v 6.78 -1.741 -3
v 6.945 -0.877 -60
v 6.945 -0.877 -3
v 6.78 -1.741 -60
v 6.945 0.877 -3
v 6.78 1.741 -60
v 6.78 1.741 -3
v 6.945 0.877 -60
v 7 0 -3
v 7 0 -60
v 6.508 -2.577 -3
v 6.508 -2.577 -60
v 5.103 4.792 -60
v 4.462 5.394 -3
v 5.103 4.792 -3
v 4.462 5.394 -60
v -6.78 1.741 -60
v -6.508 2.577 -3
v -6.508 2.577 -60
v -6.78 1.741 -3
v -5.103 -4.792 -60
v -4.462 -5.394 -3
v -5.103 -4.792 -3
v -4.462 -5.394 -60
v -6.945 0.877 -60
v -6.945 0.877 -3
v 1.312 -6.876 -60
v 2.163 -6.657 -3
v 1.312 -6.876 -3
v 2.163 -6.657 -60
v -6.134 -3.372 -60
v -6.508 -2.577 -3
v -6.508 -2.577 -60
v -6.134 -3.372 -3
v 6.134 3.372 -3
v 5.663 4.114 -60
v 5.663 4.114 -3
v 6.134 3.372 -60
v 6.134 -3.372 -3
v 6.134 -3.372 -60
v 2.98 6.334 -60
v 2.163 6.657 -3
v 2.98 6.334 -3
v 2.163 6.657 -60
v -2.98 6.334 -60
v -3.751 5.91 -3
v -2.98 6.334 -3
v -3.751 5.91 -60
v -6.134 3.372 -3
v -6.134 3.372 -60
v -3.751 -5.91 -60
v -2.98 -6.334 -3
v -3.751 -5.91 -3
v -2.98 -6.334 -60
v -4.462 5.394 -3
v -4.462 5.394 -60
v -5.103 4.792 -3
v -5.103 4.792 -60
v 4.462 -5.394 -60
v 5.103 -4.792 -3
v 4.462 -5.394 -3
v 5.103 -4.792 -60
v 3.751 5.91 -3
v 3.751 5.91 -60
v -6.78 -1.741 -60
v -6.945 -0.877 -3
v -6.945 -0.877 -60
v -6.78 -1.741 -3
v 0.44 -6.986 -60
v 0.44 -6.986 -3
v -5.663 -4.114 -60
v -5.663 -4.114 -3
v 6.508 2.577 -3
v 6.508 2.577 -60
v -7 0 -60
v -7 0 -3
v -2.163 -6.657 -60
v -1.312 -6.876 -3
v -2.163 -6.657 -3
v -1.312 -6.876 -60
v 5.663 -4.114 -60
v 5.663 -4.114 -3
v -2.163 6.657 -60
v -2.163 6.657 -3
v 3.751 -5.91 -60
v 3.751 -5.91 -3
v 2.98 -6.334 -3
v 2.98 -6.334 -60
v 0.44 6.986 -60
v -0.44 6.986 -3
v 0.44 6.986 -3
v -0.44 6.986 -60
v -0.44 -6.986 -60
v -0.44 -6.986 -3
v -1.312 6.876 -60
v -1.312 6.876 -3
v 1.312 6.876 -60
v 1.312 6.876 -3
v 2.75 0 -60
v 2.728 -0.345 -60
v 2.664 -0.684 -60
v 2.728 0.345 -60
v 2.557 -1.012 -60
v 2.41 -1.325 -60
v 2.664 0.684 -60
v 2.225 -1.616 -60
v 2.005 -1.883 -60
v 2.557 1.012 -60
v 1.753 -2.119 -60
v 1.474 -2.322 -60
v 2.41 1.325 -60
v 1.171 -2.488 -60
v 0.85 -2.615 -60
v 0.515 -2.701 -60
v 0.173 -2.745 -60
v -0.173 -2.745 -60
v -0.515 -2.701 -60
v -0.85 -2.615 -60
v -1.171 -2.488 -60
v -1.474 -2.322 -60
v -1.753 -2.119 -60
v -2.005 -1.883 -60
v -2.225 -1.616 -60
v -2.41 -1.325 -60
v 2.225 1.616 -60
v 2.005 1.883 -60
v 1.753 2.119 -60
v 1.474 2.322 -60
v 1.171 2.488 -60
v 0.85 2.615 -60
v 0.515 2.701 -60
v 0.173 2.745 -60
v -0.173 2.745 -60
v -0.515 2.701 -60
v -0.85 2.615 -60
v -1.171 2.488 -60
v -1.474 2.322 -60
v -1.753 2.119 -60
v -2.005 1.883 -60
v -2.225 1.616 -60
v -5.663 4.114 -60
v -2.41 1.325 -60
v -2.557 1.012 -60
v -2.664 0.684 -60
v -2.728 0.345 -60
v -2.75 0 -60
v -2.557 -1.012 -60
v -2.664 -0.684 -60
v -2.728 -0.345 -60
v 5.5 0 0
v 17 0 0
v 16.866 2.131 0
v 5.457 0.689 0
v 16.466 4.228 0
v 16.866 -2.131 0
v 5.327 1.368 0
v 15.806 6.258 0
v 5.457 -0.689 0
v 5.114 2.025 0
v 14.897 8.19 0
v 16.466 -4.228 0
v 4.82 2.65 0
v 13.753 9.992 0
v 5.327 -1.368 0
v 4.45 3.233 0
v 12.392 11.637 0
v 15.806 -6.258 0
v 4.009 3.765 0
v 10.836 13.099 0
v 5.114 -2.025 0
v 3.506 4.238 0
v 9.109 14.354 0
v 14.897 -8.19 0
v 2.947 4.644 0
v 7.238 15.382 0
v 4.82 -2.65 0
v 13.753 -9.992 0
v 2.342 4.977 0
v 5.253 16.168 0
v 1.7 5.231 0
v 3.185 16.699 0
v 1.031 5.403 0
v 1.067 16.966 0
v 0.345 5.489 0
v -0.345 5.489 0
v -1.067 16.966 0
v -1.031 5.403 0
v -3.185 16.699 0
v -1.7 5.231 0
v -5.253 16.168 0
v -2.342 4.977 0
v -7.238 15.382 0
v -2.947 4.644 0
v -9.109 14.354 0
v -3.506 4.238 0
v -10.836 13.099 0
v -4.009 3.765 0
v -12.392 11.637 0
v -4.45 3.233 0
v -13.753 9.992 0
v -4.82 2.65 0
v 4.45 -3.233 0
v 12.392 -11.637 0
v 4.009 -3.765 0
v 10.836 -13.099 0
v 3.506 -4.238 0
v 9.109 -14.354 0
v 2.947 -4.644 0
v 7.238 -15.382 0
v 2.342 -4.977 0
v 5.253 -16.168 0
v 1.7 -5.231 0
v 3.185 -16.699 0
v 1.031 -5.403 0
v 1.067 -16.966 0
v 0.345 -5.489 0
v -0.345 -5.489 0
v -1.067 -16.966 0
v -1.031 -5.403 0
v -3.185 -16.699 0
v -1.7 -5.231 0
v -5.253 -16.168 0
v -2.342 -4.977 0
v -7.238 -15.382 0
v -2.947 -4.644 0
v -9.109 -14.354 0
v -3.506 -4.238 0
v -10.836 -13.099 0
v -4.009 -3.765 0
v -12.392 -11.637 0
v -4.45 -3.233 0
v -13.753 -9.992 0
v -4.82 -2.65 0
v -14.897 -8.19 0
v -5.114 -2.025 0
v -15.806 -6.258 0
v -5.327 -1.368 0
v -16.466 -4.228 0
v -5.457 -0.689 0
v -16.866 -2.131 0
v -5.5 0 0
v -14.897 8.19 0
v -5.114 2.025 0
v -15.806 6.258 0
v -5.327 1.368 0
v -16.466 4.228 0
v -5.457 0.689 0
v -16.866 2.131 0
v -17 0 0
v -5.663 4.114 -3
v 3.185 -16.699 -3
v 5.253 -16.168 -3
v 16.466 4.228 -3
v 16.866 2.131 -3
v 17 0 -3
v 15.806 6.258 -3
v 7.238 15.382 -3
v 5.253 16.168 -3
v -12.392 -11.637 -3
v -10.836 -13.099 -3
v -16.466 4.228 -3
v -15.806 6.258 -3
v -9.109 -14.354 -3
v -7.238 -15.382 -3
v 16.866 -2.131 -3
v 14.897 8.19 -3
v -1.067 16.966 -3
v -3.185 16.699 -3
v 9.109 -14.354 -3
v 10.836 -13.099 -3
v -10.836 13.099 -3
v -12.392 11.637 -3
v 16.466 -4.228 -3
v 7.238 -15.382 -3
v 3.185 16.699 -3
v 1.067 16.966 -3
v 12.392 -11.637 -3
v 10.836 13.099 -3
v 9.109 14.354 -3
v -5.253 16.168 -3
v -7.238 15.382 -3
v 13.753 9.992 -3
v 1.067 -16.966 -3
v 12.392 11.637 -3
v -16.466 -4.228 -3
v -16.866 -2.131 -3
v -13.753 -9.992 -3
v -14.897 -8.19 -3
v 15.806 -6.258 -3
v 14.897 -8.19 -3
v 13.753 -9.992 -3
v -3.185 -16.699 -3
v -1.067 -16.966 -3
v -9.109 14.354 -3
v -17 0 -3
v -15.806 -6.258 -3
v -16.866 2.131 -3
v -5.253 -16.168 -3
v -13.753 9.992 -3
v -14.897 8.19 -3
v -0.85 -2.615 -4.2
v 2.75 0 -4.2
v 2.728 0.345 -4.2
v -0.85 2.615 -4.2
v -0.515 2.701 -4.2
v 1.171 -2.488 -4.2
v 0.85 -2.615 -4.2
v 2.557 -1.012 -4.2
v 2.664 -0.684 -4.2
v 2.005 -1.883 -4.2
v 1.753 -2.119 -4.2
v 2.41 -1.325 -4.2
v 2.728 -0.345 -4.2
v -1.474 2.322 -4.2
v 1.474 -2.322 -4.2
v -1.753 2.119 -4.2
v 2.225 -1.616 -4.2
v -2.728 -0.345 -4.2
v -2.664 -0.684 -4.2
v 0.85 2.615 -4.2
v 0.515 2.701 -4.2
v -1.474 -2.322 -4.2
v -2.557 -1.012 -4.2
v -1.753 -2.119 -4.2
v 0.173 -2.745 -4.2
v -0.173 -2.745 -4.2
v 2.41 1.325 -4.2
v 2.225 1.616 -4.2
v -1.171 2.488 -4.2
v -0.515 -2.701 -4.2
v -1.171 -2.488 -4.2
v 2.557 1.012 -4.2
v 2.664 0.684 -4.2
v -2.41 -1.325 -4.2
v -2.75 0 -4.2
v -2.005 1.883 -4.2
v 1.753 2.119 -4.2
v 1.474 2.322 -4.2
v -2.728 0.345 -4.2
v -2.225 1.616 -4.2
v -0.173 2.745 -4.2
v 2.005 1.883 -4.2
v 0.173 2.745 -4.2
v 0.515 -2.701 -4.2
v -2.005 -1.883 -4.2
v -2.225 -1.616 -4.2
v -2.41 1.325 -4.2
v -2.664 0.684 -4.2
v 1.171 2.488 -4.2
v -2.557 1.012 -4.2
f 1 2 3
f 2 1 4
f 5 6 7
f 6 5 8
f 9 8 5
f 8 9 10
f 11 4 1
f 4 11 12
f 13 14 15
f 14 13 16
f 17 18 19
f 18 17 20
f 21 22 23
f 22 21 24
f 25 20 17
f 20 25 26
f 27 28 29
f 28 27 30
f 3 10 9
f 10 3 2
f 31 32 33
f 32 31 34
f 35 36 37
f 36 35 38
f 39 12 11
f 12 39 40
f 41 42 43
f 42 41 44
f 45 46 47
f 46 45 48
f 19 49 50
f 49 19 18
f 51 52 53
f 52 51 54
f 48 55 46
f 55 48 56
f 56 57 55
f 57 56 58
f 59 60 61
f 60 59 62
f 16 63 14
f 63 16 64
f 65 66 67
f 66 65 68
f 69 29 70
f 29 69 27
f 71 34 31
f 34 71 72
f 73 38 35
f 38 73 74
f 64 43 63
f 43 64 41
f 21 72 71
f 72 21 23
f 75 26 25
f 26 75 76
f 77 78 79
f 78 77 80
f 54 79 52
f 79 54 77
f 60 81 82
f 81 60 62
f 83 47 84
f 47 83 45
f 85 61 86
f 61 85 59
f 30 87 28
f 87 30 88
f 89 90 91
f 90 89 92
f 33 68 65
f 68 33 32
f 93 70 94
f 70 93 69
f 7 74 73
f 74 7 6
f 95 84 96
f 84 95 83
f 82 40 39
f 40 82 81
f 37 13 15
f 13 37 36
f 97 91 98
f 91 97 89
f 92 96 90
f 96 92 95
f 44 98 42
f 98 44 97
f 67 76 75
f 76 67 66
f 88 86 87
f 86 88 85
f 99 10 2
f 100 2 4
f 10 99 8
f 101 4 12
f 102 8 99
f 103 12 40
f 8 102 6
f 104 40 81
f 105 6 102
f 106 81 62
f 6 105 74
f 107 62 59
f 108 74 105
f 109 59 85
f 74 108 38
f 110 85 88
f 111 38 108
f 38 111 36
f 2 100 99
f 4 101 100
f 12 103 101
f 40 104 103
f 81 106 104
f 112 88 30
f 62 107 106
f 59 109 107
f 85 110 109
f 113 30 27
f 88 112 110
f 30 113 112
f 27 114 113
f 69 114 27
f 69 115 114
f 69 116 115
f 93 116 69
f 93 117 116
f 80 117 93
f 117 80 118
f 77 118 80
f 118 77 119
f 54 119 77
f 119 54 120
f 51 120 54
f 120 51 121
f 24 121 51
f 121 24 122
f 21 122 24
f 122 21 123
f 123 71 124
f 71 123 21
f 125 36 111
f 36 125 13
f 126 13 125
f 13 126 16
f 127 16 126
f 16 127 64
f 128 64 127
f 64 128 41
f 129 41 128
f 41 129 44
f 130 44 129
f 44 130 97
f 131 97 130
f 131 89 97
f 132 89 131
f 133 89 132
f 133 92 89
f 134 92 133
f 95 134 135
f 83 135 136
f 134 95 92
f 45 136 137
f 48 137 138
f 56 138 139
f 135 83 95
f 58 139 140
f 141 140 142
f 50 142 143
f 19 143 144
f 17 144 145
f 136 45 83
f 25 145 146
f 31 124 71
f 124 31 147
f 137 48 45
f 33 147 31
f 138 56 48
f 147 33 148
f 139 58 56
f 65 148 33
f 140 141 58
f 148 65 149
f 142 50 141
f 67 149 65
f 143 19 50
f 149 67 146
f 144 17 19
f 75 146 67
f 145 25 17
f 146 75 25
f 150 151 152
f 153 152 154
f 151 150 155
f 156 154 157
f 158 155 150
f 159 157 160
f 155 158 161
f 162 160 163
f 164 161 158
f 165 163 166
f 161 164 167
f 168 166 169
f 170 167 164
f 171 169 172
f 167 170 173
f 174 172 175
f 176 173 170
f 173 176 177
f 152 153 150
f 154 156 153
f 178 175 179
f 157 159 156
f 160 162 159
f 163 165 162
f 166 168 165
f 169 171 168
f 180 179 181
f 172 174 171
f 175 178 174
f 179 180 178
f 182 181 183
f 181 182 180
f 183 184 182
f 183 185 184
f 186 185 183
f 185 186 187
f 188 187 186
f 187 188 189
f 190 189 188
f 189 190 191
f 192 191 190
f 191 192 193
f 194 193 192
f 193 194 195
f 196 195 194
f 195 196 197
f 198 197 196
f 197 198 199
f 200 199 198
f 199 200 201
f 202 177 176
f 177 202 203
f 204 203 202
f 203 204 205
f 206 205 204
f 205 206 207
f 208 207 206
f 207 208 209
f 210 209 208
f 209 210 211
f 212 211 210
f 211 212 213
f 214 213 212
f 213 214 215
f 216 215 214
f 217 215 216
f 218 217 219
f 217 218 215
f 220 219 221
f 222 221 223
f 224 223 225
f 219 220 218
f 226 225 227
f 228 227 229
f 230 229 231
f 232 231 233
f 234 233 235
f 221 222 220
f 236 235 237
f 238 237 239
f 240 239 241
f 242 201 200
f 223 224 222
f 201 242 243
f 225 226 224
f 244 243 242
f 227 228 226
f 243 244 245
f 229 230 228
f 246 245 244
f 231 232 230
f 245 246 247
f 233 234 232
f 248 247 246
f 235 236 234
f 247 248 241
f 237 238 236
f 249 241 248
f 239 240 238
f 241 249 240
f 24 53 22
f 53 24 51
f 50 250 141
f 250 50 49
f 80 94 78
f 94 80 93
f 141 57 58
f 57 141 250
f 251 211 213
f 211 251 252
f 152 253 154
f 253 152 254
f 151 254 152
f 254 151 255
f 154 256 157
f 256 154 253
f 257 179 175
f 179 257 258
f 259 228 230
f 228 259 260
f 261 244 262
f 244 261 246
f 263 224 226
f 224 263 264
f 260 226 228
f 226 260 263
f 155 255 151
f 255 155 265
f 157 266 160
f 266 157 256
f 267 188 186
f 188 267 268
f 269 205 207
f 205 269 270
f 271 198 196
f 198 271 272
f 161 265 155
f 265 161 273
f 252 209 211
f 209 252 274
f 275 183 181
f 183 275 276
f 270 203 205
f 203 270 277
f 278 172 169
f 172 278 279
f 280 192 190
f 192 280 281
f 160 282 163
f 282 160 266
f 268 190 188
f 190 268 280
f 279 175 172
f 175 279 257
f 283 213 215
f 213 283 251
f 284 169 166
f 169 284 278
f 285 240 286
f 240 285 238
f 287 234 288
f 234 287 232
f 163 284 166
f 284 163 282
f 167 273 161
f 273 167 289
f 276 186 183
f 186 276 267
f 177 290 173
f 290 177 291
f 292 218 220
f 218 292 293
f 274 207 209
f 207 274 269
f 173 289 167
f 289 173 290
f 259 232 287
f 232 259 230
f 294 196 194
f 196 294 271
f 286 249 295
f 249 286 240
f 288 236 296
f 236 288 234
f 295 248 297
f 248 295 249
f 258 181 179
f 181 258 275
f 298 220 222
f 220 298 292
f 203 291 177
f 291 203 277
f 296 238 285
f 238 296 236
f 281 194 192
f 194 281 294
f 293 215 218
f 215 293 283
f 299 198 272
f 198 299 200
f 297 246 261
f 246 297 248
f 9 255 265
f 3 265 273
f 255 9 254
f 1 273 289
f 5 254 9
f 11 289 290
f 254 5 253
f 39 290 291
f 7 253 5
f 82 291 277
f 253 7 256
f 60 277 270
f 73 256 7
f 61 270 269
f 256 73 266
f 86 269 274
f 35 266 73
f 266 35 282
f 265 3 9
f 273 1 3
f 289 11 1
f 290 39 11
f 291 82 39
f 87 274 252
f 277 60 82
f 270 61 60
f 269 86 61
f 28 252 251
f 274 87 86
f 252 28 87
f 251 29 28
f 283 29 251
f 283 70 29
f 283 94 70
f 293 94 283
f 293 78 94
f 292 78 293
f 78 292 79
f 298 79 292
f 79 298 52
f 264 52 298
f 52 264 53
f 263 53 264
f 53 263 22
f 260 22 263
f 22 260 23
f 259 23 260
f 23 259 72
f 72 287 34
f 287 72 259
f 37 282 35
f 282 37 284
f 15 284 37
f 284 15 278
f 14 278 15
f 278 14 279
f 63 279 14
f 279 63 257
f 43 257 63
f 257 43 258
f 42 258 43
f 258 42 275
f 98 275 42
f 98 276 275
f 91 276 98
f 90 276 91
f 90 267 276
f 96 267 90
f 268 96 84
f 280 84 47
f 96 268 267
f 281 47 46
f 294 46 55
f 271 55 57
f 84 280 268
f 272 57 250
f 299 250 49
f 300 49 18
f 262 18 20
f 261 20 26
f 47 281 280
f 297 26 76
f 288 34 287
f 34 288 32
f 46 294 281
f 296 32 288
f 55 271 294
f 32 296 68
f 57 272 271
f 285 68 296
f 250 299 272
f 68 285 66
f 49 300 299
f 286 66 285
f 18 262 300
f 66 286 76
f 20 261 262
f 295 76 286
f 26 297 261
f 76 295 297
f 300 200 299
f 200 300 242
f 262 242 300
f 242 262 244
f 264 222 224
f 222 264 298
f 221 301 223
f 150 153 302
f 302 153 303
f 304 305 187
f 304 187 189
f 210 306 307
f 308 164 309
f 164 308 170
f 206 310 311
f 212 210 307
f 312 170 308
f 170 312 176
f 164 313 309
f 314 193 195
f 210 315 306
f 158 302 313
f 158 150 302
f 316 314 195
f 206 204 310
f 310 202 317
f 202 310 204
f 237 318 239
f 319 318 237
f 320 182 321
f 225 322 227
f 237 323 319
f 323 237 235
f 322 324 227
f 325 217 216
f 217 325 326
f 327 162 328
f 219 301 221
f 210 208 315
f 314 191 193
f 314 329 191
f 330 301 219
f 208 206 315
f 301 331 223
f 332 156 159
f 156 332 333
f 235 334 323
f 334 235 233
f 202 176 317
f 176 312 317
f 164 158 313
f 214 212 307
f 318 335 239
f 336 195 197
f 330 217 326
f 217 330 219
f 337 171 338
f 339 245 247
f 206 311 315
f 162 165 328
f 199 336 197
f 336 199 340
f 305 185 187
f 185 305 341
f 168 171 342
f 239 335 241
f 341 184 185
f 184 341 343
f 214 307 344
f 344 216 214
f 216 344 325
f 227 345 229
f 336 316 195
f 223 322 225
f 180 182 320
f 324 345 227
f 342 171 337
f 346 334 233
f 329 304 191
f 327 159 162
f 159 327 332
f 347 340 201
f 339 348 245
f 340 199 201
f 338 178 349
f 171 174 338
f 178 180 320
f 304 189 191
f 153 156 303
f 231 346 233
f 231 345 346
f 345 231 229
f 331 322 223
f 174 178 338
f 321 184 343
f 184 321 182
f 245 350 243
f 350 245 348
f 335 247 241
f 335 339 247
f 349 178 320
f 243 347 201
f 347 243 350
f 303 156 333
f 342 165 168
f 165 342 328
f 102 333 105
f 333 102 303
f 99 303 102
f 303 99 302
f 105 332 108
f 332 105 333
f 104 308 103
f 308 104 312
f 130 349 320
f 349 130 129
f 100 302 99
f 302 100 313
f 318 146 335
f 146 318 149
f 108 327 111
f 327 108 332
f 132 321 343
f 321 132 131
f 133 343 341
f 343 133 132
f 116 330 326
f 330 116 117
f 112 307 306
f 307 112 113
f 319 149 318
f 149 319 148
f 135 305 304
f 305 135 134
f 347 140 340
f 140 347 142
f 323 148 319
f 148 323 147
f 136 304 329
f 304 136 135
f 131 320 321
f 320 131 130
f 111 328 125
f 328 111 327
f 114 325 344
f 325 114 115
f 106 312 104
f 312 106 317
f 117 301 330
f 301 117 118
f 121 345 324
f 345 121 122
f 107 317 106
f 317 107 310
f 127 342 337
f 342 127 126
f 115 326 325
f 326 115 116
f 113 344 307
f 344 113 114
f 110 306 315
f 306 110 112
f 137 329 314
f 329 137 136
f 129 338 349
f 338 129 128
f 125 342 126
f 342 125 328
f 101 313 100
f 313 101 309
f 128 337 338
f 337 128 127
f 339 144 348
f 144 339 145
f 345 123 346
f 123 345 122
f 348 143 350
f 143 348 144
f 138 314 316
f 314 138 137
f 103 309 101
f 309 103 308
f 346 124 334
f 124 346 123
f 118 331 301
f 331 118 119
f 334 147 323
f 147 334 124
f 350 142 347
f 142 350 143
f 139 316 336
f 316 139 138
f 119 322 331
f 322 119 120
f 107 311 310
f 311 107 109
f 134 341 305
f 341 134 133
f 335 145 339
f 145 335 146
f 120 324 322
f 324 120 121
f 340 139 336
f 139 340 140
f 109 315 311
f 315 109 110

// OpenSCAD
$fn = 50;


difference() {
	union() {
		translate(v = [0, 0, -60.0000000000]) {
			cylinder(h = 60, r = 7.0000000000);
		}
		translate(v = [0, 0, -3.0000000000]) {
			cylinder(h = 3, r = 17.0000000000);
		}
	}
	union() {
		translate(v = [0, 0, 0]) {
			rotate(a = [0, 0, 0]) {
				difference() {
					union() {
						#translate(v = [0, 0, -60.0000000000]) {
							cylinder(h = 60, r = 2.2500000000);
						}
						#translate(v = [0, 0, -4.2000000000]) {
							cylinder(h = 4.2000000000, r = 7.0000000000, r1 = 2.7500000000, r2 = 5.5000000000);
						}
						#translate(v = [0, 0, -60.0000000000]) {
							cylinder(h = 60, r = 2.7500000000);
						}
						#translate(v = [0, 0, -60.0000000000]) {
							cylinder(h = 60, r = 2.2500000000);
						}
					}
					union();
				}
			}
		}
	}
}
